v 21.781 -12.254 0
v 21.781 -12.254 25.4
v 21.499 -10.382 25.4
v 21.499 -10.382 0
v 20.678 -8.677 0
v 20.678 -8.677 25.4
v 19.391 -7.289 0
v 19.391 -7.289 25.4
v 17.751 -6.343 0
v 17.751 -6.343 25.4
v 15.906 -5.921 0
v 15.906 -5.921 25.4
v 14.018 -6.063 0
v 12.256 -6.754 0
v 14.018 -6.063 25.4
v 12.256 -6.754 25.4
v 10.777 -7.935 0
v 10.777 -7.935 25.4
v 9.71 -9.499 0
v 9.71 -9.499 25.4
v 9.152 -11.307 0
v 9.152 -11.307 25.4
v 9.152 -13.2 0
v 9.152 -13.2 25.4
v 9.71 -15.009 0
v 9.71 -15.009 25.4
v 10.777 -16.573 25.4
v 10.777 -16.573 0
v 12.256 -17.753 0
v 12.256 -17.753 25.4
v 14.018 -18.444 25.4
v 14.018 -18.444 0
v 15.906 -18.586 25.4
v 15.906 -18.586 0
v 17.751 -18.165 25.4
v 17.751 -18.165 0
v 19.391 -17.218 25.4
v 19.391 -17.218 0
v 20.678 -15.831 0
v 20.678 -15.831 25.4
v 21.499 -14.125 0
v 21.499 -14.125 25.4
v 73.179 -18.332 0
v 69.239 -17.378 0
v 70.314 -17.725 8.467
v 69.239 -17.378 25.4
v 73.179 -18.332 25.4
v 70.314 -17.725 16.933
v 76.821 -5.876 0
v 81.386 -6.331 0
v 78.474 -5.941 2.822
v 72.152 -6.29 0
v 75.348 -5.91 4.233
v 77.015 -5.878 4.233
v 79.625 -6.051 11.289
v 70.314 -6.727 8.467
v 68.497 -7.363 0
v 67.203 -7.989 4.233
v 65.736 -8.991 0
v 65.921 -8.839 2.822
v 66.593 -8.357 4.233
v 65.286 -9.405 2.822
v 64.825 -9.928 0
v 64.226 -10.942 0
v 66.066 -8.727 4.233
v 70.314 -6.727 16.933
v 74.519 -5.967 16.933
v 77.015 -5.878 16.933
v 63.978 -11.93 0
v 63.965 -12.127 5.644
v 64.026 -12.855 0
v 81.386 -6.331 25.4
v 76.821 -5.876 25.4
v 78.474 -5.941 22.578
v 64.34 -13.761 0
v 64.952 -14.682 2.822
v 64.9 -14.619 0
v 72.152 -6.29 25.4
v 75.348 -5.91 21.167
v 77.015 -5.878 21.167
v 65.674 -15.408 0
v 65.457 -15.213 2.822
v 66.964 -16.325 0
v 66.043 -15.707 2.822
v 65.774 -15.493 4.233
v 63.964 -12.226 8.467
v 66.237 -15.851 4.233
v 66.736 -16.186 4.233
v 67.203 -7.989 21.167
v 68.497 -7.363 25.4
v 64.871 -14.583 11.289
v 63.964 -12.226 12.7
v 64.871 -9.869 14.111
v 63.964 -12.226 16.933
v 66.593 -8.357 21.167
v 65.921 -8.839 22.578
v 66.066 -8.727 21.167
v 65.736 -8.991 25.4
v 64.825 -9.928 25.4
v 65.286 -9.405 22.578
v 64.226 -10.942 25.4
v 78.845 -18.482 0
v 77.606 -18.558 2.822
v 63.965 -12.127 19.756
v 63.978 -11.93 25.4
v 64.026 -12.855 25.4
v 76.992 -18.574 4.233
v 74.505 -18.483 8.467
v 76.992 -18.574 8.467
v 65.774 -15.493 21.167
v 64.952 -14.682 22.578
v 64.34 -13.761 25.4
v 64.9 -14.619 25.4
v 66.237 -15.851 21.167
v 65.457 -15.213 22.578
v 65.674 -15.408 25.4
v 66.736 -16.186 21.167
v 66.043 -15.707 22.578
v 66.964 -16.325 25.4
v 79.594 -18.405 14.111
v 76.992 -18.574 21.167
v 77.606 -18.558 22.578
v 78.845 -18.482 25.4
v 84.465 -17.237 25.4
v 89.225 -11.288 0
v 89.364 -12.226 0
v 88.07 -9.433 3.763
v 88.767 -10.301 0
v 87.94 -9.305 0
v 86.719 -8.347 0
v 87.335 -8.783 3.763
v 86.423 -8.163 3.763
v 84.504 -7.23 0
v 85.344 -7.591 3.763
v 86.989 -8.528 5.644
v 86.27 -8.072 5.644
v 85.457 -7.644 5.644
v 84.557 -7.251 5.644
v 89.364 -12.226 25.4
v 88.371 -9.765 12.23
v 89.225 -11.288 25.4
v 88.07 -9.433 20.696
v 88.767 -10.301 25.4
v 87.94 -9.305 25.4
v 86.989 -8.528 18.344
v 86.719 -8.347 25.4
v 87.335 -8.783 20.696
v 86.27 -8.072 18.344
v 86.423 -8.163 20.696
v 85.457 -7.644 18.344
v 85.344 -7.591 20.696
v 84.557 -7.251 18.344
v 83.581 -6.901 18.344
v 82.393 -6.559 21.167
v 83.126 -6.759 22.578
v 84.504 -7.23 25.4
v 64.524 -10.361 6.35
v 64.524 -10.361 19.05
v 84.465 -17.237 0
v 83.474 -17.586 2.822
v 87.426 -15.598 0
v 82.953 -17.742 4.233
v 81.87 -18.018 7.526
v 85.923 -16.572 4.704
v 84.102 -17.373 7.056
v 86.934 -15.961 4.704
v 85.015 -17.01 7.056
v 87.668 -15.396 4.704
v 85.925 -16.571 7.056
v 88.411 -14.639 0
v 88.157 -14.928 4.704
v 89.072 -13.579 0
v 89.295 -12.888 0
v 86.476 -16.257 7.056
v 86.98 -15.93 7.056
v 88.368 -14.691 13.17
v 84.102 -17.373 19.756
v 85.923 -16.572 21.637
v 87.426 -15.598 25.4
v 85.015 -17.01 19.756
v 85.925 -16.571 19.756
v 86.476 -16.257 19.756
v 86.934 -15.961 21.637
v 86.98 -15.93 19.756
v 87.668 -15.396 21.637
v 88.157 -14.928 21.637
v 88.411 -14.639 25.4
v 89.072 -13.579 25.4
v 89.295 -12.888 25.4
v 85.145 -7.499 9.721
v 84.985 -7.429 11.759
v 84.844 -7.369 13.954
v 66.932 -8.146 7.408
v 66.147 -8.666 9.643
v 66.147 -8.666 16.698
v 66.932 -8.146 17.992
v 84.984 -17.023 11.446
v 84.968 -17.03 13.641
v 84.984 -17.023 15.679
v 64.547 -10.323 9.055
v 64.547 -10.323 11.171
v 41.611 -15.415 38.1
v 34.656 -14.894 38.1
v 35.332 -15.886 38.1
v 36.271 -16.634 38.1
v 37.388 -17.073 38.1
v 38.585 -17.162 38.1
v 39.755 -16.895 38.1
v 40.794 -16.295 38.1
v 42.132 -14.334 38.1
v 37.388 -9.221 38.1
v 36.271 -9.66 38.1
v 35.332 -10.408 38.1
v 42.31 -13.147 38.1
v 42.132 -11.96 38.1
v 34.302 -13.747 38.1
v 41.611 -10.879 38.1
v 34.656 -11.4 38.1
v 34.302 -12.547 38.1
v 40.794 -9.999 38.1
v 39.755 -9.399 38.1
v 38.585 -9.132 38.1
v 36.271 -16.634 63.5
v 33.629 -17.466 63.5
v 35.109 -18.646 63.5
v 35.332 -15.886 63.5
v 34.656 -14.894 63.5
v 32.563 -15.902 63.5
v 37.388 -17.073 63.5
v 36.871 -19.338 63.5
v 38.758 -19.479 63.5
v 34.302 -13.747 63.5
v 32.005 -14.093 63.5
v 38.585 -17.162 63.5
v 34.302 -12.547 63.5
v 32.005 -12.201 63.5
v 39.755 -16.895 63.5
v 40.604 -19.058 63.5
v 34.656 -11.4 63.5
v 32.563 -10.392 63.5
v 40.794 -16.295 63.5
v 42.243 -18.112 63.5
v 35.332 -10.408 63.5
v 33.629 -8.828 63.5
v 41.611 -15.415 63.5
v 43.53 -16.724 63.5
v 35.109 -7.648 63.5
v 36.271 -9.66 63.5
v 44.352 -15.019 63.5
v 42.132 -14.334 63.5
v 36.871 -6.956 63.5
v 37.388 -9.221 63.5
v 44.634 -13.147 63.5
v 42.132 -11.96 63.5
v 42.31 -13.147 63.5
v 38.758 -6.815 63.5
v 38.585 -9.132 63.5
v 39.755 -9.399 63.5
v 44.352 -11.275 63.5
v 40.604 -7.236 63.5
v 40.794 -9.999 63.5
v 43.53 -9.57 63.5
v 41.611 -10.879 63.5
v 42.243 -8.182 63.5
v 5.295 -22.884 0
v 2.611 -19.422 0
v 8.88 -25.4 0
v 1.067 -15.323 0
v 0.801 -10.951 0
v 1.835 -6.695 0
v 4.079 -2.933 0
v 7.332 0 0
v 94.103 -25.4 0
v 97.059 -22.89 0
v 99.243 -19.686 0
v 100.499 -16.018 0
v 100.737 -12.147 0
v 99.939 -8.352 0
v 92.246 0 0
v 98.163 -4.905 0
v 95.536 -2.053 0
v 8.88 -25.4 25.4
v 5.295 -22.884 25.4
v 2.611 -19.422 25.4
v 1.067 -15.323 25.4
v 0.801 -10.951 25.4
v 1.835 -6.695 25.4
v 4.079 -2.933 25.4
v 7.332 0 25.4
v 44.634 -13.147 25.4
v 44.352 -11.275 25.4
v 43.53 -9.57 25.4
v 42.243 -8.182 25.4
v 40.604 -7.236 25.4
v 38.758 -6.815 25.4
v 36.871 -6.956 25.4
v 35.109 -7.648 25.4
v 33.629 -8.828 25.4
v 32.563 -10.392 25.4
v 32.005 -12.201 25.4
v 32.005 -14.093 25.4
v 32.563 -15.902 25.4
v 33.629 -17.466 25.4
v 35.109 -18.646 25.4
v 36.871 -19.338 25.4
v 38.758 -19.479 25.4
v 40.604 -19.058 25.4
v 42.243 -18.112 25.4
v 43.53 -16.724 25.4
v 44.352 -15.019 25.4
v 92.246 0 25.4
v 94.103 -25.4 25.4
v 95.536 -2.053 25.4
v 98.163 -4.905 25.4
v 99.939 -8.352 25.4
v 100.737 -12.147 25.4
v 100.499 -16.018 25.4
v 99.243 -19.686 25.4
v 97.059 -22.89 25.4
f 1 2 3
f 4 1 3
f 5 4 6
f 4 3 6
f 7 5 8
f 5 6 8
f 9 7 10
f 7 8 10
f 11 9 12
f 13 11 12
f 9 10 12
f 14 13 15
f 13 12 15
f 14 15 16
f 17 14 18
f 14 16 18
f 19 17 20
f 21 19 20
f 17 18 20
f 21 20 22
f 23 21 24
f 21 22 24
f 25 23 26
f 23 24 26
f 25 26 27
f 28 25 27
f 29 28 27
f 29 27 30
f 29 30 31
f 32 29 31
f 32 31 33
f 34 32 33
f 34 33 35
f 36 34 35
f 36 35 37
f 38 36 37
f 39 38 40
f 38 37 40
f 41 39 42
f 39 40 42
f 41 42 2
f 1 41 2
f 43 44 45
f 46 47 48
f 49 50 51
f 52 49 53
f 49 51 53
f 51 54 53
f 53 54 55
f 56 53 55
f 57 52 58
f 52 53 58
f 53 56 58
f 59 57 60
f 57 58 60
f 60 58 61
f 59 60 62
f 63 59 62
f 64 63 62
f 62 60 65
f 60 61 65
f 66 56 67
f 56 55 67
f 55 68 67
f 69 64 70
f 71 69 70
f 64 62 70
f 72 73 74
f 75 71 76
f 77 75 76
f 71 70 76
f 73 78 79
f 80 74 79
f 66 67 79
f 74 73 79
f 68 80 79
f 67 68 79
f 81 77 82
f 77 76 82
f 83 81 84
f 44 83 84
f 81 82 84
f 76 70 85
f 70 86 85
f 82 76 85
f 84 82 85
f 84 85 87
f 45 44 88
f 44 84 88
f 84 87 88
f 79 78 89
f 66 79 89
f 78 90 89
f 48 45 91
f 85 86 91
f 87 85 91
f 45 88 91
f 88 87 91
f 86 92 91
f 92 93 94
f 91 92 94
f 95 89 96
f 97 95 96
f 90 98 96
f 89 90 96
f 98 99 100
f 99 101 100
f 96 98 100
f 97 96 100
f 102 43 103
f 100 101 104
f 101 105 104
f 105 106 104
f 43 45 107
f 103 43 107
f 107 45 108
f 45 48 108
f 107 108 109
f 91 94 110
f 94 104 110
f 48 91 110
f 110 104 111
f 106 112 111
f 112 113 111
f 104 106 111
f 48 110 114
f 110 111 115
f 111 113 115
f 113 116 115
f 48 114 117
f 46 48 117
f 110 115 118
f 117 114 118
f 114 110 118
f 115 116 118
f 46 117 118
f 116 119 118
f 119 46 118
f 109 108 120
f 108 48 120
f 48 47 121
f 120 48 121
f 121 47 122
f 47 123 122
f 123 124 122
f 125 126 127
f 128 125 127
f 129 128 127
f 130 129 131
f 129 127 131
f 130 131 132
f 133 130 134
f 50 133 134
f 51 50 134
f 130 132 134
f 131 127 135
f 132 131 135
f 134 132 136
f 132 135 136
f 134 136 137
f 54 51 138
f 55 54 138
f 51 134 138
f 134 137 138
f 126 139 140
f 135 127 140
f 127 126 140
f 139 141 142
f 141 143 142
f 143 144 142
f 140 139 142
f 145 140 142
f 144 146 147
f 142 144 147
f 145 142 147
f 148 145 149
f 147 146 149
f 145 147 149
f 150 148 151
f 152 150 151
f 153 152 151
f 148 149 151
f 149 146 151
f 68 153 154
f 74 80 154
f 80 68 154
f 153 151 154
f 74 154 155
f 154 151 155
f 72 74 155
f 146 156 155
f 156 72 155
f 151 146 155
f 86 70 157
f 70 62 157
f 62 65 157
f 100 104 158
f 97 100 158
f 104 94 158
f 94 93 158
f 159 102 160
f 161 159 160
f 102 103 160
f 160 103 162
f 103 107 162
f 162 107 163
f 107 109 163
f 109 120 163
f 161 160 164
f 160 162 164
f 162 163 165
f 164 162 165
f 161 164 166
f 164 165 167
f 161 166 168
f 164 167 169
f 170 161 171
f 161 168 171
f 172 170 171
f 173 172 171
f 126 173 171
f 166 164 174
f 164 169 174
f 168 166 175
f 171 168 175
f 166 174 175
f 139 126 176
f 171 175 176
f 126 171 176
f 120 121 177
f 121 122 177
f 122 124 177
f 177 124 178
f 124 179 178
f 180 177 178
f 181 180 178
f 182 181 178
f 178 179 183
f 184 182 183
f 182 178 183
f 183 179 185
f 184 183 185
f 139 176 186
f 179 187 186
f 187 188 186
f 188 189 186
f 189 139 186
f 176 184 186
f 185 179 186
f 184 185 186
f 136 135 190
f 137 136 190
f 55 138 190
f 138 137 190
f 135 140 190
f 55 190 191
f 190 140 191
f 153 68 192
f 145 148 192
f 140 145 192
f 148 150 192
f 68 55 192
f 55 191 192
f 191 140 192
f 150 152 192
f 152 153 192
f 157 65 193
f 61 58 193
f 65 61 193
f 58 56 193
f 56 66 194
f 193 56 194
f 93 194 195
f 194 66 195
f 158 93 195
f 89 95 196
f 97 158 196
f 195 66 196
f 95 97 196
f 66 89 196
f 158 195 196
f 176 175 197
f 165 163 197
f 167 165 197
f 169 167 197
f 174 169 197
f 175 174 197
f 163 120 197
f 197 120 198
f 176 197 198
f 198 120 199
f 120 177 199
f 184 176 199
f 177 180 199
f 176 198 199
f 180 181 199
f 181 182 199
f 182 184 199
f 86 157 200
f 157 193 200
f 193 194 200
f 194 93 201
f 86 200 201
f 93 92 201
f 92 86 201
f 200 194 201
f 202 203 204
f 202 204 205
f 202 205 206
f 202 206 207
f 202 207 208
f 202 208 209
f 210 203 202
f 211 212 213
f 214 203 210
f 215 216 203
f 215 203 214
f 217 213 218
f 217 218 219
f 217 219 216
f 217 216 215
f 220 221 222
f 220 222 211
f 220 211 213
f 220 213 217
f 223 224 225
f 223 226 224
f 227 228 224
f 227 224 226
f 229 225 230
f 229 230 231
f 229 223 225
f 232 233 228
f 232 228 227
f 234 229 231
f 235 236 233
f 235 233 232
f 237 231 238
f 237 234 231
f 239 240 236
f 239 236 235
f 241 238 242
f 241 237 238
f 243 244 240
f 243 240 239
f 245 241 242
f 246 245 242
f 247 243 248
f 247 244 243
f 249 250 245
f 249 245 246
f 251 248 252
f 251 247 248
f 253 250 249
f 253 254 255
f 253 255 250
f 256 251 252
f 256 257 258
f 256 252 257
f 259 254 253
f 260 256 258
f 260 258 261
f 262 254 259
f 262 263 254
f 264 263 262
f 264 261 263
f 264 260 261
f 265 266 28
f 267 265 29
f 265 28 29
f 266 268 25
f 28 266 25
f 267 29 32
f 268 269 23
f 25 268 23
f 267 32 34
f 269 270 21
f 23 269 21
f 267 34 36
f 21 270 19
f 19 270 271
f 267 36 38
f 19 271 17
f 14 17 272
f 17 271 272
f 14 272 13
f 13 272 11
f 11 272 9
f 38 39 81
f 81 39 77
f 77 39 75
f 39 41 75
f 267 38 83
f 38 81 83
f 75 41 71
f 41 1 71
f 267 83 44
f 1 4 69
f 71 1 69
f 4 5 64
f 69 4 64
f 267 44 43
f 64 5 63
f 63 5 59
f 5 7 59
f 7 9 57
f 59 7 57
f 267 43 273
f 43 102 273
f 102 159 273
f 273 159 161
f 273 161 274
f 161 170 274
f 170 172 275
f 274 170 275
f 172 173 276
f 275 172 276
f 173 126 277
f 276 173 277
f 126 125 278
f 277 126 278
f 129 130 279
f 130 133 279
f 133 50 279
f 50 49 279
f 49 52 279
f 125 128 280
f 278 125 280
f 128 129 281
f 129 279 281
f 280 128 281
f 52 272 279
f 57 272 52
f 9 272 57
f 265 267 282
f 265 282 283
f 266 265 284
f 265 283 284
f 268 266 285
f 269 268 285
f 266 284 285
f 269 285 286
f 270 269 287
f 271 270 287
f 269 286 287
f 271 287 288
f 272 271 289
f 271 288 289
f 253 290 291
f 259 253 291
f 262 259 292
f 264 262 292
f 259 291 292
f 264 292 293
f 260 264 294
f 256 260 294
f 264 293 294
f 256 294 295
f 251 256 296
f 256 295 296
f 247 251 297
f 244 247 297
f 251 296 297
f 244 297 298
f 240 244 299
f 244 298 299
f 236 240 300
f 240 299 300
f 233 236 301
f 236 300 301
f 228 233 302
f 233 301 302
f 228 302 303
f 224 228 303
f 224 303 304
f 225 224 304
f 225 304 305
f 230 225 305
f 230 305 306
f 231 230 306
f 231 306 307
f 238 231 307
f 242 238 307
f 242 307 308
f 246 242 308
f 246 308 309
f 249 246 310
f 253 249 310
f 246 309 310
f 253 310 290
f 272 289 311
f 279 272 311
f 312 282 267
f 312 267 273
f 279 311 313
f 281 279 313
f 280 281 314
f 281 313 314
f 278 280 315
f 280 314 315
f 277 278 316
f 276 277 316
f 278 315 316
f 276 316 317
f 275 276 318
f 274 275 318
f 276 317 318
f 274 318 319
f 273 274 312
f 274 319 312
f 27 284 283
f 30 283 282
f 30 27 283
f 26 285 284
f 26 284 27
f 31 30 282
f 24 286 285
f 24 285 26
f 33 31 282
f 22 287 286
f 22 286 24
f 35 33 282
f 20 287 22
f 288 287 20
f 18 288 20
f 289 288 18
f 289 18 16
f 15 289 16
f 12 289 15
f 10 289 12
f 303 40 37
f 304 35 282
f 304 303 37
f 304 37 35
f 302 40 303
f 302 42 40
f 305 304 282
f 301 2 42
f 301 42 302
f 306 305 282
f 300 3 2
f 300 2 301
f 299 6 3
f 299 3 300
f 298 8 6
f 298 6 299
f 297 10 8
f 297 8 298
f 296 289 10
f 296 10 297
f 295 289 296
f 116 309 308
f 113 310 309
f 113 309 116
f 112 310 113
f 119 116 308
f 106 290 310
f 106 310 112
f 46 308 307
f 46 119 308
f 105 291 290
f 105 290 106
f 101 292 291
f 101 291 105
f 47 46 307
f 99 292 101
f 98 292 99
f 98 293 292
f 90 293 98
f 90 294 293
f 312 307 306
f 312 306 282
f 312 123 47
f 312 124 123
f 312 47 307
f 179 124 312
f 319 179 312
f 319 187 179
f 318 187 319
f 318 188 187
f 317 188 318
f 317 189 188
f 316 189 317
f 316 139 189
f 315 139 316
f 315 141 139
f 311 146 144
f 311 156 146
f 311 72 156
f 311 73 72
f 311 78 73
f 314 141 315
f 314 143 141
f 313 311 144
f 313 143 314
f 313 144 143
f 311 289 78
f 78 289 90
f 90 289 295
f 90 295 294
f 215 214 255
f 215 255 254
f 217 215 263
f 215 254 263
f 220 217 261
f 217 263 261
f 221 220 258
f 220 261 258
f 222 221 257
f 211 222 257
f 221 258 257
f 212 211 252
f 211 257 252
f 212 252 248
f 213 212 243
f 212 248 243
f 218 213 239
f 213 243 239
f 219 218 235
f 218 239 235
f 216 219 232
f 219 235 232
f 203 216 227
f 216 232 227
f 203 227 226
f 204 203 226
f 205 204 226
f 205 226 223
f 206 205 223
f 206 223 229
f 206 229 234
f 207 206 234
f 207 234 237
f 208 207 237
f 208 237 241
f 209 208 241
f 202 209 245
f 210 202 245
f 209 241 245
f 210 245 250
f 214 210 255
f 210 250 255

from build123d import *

# Parameters (mm, degrees)
F0_W      = 101.6
F0_H      = 25.4
F1_DEPTH  = 25.4
F3_DEPTH  = 25.4
F5_DEPTH  = 25.4
F6_R      = 6.35
F7_DEPTH  = 25.4
F9_DEPTH  = 25.4
F10_R     = 6.35
F11_DEPTH = 38.1
F12_R     = 4.026604
F13_DEPTH = 25.4


with BuildPart() as f1:
    # F0 (on Front) → F1 (new body)
    with BuildSketch(Plane.XZ):
        with Locations((50.8, 12.7)):
            Rectangle(F0_W, F0_H)
    extrude(amount=F1_DEPTH)

    # F2 (on face) → F3 (cut)
    with BuildSketch(Plane.XY.offset(25.4)):
        with BuildLine():
            ThreePointArc((92.245728, 0), (100.736841, -12.147069), (94.10283, -25.4))
            Line((94.10283, -25.4), (101.6, -25.4))
            Line((101.6, -25.4), (101.6, 0))
            Line((101.6, 0), (92.245728, 0))
        make_face()
    extrude(amount=-F3_DEPTH, mode=Mode.SUBTRACT)

    # F4 (on face) → F5 (cut)
    with BuildSketch(Plane.XY.offset(25.4)):
        with BuildLine():
            ThreePointArc((8.879754, -25.4), (0.770196, -13.146957), (7.332172, 0))
            Line((7.332172, 0), (0, 0))
            Line((0, 0), (0, -25.4))
            Line((0, -25.4), (8.879754, -25.4))
        make_face()
    extrude(amount=-F5_DEPTH, mode=Mode.SUBTRACT)

    # F6 (on face) → F7 (cut)
    with BuildSketch(Plane.XY.offset(25.4)):
        with Locations((15.431477, -12.253668)):
            Circle(F6_R)
    extrude(amount=-F7_DEPTH, mode=Mode.SUBTRACT)

    # F8 (on face) → F9 (cut)
    with BuildSketch(Plane.XY.offset(25.4)):
        with BuildLine():
            add(Edge.make_bspline(
                [(89.363859, -12.2259), (89.363859, -1.227377), (70.313859, -6.726639), (51.263859, -12.2259), (70.313859, -17.725161), (89.363859, -23.224422), (89.363859, -12.2259)],
                knots=[0, 0, 0, 2.094395, 2.094395, 4.18879, 4.18879, 6.283185, 6.283185, 6.283185], degree=2, weights=[1, 0.5, 1, 0.5, 1, 0.5, 1]))
        make_face()
    extrude(amount=-F9_DEPTH, mode=Mode.SUBTRACT)

    # F10 (on face) → F11 (join)
    with BuildSketch(Plane.XY.offset(25.4)):
        with Locations((38.283817, -13.146957)):
            Circle(F10_R)
    extrude(amount=F11_DEPTH)

    # F12 (on face) → F13 (cut)
    with BuildSketch(Plane.XY.offset(63.5)):
        with Locations((38.283817, -13.146957)):
            Circle(F12_R)
    extrude(amount=-F13_DEPTH, mode=Mode.SUBTRACT)


solid = f1.part
